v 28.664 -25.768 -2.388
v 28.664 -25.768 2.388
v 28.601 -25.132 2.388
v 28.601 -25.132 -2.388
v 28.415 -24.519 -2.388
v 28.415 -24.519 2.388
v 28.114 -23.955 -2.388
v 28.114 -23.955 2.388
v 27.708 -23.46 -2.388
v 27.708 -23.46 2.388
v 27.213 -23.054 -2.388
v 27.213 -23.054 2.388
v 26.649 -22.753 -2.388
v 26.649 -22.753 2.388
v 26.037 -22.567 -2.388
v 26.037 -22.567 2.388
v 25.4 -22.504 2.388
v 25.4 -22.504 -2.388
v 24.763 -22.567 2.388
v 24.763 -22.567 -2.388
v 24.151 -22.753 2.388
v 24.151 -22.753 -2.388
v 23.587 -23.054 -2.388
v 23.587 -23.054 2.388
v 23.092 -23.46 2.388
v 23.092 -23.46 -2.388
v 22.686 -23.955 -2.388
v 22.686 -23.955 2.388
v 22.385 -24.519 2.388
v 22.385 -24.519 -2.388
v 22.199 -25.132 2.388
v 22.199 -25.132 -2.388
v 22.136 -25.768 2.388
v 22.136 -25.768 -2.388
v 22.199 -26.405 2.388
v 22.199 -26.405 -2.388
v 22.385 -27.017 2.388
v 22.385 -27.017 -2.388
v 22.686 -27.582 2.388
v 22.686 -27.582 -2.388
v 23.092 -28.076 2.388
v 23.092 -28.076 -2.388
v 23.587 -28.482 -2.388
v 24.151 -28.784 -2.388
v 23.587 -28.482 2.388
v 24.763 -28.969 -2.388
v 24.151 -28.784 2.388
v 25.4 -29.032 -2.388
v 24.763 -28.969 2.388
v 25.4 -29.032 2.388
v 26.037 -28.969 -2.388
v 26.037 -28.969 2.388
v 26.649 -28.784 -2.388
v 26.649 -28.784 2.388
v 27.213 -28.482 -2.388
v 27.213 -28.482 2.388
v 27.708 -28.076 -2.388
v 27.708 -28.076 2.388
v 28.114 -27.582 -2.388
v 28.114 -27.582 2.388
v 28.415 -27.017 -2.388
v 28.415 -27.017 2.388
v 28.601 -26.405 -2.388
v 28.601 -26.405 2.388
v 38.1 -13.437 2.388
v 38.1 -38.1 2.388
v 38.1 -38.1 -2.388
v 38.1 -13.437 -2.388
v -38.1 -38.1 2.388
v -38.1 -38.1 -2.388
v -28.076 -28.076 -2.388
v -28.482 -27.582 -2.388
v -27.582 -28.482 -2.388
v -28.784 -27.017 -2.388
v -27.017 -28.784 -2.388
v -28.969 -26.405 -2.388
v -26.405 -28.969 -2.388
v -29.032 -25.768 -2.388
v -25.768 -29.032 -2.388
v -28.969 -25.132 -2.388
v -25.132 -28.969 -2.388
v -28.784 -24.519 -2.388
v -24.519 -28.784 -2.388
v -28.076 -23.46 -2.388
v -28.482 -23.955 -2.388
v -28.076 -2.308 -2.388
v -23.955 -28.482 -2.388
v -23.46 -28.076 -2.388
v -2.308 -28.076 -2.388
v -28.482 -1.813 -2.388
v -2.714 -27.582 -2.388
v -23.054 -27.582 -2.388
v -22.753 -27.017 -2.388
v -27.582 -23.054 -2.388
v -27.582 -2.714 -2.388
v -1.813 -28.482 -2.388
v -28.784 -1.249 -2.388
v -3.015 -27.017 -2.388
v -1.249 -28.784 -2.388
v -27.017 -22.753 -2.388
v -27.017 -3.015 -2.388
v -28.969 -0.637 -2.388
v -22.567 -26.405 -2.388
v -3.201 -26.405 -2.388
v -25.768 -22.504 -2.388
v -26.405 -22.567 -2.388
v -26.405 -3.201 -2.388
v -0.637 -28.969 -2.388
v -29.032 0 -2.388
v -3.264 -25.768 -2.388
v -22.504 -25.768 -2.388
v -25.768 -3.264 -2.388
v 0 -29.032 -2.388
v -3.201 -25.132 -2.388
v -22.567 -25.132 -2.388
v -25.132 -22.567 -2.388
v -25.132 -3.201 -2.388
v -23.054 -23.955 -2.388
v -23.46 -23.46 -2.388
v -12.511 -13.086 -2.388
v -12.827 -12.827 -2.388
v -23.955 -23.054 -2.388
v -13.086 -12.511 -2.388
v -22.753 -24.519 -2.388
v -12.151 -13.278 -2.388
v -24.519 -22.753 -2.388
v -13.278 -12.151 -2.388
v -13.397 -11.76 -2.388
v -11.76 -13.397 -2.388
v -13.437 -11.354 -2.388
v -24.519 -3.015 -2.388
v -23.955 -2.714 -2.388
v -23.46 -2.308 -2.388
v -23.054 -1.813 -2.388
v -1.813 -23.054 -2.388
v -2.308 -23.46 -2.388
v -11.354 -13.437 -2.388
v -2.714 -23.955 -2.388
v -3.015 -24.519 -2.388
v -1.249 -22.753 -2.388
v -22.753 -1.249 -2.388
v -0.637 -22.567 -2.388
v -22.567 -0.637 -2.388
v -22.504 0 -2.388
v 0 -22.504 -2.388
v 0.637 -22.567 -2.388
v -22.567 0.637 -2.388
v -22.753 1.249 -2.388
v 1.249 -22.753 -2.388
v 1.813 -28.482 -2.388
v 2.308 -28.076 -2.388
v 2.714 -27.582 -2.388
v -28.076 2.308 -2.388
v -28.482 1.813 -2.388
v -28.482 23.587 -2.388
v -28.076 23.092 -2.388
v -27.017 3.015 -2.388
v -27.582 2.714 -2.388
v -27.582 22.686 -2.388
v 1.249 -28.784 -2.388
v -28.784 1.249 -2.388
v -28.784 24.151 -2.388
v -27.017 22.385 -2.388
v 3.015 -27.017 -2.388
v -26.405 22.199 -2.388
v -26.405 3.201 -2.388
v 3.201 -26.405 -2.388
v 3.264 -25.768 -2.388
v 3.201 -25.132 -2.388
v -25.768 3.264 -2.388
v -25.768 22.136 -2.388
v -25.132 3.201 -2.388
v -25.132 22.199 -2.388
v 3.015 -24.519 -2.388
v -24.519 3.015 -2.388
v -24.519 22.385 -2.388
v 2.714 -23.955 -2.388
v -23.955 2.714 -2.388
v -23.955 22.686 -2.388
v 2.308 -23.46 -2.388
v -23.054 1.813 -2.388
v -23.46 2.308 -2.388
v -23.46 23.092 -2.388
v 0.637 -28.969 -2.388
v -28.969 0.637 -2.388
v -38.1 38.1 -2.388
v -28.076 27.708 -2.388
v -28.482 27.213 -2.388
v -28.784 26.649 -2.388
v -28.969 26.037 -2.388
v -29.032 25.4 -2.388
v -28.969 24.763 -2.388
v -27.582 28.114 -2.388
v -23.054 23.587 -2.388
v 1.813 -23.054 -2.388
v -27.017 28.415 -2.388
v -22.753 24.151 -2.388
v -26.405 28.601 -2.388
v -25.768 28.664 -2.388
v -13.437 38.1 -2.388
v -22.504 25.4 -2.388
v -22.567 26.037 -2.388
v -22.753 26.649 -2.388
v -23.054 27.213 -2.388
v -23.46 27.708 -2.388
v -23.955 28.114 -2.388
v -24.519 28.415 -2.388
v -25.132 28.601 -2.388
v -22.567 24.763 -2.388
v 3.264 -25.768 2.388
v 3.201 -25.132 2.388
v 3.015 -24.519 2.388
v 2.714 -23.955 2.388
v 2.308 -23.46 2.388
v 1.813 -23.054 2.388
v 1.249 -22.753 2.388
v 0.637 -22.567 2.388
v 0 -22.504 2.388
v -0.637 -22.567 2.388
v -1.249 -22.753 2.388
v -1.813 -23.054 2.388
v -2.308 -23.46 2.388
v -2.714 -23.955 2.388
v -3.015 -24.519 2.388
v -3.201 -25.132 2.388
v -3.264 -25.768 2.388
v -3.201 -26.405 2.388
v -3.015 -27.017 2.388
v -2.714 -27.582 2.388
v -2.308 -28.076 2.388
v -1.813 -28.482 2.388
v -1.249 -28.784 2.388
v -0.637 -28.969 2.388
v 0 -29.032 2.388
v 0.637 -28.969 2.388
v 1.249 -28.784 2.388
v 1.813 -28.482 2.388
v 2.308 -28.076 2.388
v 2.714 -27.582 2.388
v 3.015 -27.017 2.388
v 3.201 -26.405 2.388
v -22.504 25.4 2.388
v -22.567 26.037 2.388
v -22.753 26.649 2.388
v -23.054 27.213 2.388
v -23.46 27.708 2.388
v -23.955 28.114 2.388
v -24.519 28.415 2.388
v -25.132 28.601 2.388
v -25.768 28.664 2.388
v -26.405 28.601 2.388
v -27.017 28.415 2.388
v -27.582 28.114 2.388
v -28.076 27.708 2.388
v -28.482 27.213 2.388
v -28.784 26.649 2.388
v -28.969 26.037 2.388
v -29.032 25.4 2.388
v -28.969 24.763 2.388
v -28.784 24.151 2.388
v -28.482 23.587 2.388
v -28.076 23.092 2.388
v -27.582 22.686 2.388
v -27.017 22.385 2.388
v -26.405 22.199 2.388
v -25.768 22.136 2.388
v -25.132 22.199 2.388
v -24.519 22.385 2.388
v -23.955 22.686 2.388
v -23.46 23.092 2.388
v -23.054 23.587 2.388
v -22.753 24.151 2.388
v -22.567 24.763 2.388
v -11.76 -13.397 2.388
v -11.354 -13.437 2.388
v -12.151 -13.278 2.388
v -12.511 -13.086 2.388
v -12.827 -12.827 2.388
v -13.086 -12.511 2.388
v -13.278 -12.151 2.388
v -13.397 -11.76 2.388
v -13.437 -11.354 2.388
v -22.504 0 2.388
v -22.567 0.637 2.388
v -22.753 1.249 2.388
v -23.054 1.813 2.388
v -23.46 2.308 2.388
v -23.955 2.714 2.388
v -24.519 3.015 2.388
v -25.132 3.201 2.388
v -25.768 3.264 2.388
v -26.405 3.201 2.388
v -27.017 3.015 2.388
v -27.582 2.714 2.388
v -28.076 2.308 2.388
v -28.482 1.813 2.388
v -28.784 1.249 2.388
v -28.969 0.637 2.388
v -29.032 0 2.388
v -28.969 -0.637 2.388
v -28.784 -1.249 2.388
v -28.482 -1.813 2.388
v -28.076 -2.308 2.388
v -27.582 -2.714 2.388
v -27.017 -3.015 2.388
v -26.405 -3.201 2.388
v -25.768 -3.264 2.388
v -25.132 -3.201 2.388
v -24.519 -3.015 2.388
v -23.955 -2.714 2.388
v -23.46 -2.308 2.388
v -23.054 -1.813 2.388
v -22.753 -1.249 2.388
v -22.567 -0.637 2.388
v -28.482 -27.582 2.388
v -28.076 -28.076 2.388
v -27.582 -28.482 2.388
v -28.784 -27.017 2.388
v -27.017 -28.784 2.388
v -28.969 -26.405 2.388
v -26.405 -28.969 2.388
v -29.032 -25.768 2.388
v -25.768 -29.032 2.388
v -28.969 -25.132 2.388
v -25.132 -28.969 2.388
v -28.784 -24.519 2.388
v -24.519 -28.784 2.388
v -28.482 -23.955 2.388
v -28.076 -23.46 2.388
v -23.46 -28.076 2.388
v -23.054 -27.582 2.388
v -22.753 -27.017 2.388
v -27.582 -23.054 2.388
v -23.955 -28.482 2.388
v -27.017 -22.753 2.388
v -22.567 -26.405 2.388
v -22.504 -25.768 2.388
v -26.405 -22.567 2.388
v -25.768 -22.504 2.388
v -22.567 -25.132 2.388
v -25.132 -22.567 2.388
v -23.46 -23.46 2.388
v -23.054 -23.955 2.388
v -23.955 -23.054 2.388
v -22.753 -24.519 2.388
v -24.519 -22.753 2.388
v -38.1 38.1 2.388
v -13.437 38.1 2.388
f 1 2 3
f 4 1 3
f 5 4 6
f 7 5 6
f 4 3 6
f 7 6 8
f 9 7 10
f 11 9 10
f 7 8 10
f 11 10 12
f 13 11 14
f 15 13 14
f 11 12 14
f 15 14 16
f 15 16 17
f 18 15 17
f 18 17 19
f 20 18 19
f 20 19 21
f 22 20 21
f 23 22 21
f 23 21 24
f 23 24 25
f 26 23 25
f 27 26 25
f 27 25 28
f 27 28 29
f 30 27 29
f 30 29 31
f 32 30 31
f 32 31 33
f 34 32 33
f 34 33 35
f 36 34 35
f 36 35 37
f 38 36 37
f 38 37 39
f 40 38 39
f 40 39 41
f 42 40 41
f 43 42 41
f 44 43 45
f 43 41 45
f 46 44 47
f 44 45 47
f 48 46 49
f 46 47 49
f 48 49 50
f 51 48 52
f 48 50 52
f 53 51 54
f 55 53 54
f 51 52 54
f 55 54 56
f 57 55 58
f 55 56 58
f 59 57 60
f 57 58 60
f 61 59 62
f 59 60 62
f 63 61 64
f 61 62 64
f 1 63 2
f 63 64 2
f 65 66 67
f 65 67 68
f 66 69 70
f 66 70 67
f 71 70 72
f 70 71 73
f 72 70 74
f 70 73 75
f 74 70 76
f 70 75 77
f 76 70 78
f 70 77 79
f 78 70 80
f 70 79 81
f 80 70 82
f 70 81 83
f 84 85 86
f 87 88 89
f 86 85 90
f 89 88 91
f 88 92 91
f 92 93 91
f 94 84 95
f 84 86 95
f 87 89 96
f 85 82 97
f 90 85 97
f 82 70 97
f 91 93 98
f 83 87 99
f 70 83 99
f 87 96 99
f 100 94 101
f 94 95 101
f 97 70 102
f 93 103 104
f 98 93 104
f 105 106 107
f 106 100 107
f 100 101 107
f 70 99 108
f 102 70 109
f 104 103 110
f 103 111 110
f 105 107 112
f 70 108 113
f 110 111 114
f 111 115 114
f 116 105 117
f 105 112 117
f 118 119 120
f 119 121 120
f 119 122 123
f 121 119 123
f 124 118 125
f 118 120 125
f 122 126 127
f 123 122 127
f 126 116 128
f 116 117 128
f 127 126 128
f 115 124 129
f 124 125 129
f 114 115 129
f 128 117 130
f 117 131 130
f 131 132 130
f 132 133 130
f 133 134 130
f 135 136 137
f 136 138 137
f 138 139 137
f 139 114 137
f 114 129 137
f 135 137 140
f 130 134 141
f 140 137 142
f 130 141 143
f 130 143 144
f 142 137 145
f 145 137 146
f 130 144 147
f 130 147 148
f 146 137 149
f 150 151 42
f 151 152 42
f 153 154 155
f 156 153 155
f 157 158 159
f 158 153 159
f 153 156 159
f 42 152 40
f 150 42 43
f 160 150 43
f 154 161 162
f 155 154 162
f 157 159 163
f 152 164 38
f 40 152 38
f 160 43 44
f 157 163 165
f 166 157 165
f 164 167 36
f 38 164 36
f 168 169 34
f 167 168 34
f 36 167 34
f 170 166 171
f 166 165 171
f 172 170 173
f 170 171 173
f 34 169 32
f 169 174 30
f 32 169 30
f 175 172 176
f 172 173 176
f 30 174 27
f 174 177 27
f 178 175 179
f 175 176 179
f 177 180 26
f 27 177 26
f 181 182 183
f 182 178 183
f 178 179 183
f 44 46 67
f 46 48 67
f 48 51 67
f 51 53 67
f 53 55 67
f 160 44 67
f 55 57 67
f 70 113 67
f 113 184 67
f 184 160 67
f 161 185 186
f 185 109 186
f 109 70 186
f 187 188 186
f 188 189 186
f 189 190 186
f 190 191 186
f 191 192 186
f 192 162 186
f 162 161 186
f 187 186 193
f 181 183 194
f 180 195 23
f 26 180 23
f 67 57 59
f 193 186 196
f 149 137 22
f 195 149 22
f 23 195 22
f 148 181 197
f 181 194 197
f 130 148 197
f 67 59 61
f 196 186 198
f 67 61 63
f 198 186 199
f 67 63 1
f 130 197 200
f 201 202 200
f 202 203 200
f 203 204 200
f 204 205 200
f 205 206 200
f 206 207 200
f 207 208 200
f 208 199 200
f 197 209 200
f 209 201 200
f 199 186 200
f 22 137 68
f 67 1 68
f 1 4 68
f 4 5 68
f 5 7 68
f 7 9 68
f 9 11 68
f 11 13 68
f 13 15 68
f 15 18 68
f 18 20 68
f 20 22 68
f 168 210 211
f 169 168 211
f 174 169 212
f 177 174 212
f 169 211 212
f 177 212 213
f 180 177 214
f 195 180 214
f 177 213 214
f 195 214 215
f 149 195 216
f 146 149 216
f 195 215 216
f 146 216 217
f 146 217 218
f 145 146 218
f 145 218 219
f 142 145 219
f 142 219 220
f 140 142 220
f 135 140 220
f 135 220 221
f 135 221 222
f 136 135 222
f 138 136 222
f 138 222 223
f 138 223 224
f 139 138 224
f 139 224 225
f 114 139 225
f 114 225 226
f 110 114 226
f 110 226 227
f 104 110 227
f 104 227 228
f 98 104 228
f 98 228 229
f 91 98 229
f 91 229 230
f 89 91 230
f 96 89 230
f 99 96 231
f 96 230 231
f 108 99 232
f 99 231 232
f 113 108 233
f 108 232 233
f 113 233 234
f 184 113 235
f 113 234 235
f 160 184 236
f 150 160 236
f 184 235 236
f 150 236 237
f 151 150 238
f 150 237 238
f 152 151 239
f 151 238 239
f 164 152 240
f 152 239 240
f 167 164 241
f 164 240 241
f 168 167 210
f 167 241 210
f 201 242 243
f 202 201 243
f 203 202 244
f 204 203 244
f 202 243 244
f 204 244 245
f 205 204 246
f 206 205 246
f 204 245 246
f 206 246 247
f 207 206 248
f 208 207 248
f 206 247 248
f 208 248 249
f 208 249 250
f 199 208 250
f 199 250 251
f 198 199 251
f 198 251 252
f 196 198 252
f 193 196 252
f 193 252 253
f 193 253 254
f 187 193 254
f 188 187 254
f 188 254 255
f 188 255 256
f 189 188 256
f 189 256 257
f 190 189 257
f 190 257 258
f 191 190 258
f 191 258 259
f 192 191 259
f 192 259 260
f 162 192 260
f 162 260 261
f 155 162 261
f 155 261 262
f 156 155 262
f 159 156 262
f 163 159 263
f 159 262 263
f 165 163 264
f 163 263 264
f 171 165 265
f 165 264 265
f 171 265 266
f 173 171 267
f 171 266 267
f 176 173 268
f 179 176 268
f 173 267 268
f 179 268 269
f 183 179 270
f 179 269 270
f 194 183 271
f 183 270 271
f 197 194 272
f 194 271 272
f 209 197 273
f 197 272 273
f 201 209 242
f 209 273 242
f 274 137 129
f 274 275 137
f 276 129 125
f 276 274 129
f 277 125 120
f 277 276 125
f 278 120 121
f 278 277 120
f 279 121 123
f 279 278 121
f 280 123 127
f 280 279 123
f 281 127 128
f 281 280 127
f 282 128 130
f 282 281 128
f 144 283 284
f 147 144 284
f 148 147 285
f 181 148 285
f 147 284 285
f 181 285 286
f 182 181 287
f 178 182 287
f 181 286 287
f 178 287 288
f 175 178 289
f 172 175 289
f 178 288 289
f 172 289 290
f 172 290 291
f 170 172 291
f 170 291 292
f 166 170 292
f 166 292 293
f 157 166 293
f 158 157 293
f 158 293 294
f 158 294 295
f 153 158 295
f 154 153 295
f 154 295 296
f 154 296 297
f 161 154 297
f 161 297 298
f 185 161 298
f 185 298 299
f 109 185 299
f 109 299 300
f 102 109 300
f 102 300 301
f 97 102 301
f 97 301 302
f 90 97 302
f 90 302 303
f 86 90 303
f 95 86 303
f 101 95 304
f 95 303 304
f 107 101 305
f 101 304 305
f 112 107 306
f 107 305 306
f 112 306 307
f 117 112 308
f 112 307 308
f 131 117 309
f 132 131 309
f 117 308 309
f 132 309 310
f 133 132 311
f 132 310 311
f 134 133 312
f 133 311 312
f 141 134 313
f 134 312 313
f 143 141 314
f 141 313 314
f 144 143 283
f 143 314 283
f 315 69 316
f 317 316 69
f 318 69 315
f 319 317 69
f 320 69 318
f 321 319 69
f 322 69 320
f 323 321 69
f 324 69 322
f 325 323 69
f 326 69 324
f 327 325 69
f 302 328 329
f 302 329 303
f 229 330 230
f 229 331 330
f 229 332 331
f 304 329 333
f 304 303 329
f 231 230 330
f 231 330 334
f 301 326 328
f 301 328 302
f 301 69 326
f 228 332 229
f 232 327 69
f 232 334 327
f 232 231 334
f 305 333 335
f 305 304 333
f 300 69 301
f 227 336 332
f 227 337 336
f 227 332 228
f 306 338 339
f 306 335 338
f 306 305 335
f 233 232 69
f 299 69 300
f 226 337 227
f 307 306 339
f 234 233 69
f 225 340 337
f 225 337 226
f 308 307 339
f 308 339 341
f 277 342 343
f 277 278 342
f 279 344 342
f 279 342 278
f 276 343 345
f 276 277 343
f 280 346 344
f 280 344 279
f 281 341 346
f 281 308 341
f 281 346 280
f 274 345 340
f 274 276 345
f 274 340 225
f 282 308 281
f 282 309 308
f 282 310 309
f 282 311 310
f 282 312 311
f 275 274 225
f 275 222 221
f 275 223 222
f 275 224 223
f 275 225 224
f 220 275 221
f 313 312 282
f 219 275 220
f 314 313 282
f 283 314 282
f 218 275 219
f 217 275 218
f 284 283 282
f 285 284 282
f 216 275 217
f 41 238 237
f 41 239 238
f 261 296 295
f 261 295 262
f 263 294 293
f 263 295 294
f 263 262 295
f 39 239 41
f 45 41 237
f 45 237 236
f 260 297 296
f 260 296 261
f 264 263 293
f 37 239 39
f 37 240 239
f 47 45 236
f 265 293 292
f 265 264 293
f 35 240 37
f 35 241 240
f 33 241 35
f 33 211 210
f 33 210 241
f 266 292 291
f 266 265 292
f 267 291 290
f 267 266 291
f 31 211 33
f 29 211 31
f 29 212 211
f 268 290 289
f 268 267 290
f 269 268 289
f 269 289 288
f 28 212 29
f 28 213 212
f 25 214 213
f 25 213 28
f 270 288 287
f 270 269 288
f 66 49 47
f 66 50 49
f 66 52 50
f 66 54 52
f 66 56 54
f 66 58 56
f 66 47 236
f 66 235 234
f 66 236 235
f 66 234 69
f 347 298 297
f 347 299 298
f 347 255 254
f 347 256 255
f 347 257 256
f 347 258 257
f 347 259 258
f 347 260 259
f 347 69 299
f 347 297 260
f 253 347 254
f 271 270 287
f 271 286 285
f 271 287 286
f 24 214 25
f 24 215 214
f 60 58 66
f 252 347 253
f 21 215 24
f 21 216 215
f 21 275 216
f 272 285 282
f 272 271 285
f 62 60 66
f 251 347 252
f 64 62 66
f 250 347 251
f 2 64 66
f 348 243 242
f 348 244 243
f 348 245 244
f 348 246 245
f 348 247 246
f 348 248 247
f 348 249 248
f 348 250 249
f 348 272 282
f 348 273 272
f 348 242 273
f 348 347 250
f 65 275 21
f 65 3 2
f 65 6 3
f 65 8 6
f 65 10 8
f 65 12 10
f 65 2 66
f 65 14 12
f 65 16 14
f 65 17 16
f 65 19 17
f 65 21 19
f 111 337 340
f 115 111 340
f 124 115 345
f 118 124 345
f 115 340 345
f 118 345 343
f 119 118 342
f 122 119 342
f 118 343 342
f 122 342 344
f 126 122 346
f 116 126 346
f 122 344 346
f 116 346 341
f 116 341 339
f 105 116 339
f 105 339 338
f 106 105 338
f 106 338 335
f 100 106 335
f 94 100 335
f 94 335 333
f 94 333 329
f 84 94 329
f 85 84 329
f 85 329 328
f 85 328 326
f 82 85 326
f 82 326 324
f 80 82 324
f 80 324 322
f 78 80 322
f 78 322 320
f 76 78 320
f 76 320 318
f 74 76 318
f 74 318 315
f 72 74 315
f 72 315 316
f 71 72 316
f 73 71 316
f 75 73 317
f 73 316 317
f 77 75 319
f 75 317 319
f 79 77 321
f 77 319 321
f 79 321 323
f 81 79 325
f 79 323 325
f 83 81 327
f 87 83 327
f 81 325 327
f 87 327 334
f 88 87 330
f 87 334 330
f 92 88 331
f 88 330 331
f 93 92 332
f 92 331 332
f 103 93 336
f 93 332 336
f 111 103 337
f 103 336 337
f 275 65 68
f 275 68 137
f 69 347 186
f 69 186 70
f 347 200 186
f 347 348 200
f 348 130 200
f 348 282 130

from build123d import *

# Parameters (mm, degrees)
BOSS_EXTRUDE1_DEPTH      = 2.3876
BOSS_EXTRUDE1_DEPTH_BACK = 2.3876
SKETCH4_R                = 3.2639
CUT_EXTRUDE1_DEPTH       = 1
CUT_EXTRUDE1_DEPTH_BACK  = 5.7752


with BuildPart() as part:
    # Sketch3 → Boss-Extrude1 (new body, two sides)
    with BuildSketch(Plane.XY) as boss_extrude1_sk:
        with BuildLine():
            Line((-13.4366, 38.1), (-38.1, 38.1))
            Line((-38.1, 38.1), (-38.1, -38.1))
            Line((-38.1, -38.1), (38.1, -38.1))
            Line((38.1, -38.1), (38.1, -13.4366))
            Line((38.1, -13.4366), (-11.3538, -13.4366))
            ThreePointArc((-11.3538, -13.4366), (-12.826562004, -12.826562004), (-13.4366, -11.3538))
            Line((-13.4366, -11.3538), (-13.4366, 38.1))
        make_face()
    extrude(amount=BOSS_EXTRUDE1_DEPTH)
    extrude(boss_extrude1_sk.sketch, amount=-BOSS_EXTRUDE1_DEPTH_BACK)

    # Sketch4 → Cut-Extrude1 (cut, two sides)
    with BuildSketch(Plane.XY.offset(2.3876)) as cut_extrude1_sk:
        with Locations((-25.7683, 25.4)):
            Circle(SKETCH4_R)
        with Locations((-25.7683, 0)):
            Circle(SKETCH4_R)
        with Locations((0, -25.7683)):
            Circle(SKETCH4_R)
        with Locations((25.4, -25.7683)):
            Circle(SKETCH4_R)
        with Locations((-25.7683, -25.7683)):
            Circle(SKETCH4_R)
    extrude(amount=CUT_EXTRUDE1_DEPTH, mode=Mode.SUBTRACT)
    extrude(cut_extrude1_sk.sketch, amount=-CUT_EXTRUDE1_DEPTH_BACK, mode=Mode.SUBTRACT)


solid = part.part
